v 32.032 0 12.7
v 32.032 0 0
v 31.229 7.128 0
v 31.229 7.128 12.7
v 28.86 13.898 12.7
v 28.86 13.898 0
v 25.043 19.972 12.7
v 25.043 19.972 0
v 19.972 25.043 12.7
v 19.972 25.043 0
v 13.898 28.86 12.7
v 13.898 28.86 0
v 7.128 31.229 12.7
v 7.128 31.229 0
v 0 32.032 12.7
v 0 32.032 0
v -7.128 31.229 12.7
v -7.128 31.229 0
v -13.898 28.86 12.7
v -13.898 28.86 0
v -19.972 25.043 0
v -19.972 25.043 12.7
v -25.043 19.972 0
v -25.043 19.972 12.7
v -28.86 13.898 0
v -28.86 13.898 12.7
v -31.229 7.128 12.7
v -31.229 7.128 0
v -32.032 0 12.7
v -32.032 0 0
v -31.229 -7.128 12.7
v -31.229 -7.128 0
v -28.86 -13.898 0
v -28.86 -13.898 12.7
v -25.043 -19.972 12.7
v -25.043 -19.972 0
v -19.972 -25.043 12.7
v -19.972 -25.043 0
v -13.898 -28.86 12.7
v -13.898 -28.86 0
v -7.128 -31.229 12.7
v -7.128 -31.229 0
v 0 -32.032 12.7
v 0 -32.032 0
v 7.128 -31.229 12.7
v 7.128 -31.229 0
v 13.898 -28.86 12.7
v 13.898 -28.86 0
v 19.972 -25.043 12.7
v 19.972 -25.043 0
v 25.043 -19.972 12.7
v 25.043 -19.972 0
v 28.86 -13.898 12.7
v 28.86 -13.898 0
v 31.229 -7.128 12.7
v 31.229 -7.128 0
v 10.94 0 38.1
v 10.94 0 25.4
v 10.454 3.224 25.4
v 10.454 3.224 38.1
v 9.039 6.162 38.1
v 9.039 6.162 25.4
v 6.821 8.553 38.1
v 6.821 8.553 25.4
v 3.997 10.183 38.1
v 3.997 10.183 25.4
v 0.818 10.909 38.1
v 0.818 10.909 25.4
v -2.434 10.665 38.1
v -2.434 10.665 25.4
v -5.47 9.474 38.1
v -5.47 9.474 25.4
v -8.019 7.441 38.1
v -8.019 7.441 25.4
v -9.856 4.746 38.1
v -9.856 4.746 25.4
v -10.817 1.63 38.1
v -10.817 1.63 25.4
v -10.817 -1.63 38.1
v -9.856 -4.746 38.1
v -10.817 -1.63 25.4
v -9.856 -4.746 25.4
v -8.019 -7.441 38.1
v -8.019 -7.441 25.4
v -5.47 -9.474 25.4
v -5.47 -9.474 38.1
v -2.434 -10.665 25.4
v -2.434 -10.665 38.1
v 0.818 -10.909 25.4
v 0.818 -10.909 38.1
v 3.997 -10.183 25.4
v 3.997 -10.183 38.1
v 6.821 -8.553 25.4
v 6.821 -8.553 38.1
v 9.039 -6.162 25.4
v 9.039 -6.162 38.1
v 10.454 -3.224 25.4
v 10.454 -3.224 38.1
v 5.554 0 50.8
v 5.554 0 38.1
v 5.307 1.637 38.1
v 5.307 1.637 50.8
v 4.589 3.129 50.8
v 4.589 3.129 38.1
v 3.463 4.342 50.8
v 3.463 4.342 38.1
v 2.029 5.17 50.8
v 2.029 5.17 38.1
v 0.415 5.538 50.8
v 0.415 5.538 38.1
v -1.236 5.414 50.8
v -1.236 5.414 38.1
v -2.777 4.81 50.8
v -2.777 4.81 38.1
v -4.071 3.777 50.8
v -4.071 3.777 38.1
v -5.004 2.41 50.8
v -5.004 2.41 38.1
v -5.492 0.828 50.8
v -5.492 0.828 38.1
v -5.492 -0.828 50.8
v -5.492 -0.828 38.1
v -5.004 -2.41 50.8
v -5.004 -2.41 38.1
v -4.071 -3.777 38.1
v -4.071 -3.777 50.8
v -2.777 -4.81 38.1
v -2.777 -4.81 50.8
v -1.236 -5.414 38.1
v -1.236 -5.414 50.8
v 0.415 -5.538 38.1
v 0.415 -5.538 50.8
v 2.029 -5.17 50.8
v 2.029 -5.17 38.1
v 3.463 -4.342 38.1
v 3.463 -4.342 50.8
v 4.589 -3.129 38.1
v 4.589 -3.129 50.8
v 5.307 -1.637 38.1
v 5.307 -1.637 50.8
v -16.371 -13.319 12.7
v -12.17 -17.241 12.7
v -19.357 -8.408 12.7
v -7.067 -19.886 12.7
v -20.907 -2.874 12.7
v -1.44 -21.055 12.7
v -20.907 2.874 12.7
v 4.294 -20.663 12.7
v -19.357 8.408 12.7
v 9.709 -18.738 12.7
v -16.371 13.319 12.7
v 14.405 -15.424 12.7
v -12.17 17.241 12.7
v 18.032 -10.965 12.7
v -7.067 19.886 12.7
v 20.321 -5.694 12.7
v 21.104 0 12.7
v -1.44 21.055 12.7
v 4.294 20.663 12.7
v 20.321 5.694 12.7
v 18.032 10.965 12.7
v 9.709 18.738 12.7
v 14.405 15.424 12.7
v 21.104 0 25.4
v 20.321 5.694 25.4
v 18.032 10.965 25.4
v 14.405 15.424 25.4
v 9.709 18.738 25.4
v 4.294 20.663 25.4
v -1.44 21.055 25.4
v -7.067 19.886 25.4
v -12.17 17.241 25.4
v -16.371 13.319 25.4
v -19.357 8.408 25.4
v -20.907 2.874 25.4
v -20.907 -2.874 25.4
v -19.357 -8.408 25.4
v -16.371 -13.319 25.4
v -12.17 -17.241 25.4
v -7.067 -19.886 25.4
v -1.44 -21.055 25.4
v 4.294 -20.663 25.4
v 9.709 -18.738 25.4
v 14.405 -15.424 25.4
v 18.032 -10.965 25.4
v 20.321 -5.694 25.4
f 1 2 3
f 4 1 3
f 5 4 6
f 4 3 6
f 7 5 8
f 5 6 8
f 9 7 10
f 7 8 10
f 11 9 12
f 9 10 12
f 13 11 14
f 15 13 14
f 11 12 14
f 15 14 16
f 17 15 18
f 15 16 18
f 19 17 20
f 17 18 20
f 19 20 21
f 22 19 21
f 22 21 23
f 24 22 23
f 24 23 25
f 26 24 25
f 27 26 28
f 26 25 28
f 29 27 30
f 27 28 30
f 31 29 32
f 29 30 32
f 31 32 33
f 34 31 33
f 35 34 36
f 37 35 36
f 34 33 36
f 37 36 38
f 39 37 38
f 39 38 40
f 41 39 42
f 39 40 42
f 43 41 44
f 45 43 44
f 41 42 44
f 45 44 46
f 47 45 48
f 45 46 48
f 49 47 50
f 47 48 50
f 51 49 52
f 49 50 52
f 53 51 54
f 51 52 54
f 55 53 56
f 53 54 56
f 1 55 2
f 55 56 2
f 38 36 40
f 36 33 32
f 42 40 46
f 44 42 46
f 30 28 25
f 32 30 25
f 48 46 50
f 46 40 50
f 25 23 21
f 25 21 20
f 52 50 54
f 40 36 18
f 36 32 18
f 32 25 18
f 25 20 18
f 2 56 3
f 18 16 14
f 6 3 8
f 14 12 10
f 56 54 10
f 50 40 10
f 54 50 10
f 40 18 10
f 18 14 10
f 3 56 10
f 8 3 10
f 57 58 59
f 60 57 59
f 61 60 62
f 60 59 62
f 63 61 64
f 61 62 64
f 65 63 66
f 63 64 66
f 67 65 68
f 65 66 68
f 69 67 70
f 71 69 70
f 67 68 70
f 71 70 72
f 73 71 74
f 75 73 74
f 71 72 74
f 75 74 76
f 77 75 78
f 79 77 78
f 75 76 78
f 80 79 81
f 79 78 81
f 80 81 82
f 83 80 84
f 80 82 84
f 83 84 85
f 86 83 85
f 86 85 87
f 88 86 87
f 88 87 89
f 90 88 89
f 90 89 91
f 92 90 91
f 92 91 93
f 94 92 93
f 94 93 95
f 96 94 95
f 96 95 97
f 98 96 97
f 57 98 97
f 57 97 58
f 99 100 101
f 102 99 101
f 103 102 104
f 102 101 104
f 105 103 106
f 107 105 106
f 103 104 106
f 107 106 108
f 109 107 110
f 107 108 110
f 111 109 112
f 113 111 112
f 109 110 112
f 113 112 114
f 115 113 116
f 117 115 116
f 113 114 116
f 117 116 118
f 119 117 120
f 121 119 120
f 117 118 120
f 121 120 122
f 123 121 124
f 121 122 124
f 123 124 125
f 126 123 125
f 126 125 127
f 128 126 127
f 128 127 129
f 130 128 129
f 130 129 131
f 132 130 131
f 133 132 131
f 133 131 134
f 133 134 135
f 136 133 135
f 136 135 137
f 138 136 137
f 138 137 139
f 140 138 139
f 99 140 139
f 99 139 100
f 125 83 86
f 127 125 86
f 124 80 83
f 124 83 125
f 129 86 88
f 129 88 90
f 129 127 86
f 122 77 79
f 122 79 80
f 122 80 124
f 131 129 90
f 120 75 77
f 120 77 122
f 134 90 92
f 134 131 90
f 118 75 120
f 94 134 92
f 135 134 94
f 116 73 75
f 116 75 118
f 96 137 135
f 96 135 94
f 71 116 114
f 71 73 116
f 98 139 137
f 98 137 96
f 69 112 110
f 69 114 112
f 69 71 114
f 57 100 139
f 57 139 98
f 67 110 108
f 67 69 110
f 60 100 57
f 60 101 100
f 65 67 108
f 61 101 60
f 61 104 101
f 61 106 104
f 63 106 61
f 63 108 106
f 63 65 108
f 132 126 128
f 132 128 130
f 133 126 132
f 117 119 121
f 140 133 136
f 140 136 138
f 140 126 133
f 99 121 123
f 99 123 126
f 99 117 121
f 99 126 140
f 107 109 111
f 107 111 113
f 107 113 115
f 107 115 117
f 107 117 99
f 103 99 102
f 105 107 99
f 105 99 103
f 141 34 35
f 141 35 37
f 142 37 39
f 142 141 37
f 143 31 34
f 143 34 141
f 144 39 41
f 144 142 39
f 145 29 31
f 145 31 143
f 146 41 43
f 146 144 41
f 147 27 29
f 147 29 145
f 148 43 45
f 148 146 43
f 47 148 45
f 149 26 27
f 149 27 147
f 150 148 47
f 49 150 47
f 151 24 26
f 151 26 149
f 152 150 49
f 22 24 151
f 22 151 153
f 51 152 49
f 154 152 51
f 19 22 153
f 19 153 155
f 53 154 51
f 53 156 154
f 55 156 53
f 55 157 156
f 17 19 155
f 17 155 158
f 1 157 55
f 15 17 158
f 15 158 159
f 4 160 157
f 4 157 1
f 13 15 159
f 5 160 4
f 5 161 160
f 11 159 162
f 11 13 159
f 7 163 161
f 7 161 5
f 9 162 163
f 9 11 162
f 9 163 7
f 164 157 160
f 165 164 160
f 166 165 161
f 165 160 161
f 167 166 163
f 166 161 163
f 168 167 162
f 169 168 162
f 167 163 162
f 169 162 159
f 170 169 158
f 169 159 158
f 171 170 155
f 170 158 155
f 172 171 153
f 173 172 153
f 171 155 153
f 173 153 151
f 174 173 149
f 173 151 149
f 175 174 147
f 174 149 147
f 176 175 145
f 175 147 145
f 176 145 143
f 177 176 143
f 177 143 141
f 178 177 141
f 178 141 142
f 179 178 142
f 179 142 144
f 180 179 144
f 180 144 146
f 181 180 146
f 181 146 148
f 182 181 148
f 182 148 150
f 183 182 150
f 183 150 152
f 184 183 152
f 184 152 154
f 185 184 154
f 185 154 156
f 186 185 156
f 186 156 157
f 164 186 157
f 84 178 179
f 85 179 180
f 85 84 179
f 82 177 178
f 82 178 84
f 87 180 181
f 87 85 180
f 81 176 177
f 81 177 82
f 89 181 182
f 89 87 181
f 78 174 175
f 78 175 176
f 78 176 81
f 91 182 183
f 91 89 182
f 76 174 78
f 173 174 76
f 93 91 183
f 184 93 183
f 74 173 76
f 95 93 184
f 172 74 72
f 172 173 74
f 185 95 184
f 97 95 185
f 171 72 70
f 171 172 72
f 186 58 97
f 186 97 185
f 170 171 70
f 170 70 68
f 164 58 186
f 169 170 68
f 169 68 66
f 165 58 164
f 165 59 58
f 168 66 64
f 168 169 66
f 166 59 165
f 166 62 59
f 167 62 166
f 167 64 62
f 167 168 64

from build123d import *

# Parameters (mm, degrees)
F0_R     = 32.031836
F0_R_2   = 21.104054
F1_DEPTH = 12.7
F0_R_3   = 10.939518
F2_DEPTH = 25.4
F0_R_4   = 5.553699
F3_DEPTH = 38.1
F4_DEPTH = 50.8


with BuildPart() as f1:
    # F0 (on Top) → F1 (new body)
    with BuildSketch(Plane.XY):
        Circle(F0_R)
        Circle(F0_R_2, mode=Mode.SUBTRACT)
    extrude(amount=F1_DEPTH)

    # F0 (on Top) → F2 (join)
    with BuildSketch(Plane.XY):
        Circle(F0_R_2)
        Circle(F0_R_3, mode=Mode.SUBTRACT)
    extrude(amount=F2_DEPTH)

    # F0 (on Top) → F3 (join)
    with BuildSketch(Plane.XY):
        Circle(F0_R_3)
        Circle(F0_R_4, mode=Mode.SUBTRACT)
    extrude(amount=F3_DEPTH)

    # F0 (on Top) → F4 (join)
    with BuildSketch(Plane.XY):
        Circle(F0_R_4)
    extrude(amount=F4_DEPTH)


solid = f1.part
